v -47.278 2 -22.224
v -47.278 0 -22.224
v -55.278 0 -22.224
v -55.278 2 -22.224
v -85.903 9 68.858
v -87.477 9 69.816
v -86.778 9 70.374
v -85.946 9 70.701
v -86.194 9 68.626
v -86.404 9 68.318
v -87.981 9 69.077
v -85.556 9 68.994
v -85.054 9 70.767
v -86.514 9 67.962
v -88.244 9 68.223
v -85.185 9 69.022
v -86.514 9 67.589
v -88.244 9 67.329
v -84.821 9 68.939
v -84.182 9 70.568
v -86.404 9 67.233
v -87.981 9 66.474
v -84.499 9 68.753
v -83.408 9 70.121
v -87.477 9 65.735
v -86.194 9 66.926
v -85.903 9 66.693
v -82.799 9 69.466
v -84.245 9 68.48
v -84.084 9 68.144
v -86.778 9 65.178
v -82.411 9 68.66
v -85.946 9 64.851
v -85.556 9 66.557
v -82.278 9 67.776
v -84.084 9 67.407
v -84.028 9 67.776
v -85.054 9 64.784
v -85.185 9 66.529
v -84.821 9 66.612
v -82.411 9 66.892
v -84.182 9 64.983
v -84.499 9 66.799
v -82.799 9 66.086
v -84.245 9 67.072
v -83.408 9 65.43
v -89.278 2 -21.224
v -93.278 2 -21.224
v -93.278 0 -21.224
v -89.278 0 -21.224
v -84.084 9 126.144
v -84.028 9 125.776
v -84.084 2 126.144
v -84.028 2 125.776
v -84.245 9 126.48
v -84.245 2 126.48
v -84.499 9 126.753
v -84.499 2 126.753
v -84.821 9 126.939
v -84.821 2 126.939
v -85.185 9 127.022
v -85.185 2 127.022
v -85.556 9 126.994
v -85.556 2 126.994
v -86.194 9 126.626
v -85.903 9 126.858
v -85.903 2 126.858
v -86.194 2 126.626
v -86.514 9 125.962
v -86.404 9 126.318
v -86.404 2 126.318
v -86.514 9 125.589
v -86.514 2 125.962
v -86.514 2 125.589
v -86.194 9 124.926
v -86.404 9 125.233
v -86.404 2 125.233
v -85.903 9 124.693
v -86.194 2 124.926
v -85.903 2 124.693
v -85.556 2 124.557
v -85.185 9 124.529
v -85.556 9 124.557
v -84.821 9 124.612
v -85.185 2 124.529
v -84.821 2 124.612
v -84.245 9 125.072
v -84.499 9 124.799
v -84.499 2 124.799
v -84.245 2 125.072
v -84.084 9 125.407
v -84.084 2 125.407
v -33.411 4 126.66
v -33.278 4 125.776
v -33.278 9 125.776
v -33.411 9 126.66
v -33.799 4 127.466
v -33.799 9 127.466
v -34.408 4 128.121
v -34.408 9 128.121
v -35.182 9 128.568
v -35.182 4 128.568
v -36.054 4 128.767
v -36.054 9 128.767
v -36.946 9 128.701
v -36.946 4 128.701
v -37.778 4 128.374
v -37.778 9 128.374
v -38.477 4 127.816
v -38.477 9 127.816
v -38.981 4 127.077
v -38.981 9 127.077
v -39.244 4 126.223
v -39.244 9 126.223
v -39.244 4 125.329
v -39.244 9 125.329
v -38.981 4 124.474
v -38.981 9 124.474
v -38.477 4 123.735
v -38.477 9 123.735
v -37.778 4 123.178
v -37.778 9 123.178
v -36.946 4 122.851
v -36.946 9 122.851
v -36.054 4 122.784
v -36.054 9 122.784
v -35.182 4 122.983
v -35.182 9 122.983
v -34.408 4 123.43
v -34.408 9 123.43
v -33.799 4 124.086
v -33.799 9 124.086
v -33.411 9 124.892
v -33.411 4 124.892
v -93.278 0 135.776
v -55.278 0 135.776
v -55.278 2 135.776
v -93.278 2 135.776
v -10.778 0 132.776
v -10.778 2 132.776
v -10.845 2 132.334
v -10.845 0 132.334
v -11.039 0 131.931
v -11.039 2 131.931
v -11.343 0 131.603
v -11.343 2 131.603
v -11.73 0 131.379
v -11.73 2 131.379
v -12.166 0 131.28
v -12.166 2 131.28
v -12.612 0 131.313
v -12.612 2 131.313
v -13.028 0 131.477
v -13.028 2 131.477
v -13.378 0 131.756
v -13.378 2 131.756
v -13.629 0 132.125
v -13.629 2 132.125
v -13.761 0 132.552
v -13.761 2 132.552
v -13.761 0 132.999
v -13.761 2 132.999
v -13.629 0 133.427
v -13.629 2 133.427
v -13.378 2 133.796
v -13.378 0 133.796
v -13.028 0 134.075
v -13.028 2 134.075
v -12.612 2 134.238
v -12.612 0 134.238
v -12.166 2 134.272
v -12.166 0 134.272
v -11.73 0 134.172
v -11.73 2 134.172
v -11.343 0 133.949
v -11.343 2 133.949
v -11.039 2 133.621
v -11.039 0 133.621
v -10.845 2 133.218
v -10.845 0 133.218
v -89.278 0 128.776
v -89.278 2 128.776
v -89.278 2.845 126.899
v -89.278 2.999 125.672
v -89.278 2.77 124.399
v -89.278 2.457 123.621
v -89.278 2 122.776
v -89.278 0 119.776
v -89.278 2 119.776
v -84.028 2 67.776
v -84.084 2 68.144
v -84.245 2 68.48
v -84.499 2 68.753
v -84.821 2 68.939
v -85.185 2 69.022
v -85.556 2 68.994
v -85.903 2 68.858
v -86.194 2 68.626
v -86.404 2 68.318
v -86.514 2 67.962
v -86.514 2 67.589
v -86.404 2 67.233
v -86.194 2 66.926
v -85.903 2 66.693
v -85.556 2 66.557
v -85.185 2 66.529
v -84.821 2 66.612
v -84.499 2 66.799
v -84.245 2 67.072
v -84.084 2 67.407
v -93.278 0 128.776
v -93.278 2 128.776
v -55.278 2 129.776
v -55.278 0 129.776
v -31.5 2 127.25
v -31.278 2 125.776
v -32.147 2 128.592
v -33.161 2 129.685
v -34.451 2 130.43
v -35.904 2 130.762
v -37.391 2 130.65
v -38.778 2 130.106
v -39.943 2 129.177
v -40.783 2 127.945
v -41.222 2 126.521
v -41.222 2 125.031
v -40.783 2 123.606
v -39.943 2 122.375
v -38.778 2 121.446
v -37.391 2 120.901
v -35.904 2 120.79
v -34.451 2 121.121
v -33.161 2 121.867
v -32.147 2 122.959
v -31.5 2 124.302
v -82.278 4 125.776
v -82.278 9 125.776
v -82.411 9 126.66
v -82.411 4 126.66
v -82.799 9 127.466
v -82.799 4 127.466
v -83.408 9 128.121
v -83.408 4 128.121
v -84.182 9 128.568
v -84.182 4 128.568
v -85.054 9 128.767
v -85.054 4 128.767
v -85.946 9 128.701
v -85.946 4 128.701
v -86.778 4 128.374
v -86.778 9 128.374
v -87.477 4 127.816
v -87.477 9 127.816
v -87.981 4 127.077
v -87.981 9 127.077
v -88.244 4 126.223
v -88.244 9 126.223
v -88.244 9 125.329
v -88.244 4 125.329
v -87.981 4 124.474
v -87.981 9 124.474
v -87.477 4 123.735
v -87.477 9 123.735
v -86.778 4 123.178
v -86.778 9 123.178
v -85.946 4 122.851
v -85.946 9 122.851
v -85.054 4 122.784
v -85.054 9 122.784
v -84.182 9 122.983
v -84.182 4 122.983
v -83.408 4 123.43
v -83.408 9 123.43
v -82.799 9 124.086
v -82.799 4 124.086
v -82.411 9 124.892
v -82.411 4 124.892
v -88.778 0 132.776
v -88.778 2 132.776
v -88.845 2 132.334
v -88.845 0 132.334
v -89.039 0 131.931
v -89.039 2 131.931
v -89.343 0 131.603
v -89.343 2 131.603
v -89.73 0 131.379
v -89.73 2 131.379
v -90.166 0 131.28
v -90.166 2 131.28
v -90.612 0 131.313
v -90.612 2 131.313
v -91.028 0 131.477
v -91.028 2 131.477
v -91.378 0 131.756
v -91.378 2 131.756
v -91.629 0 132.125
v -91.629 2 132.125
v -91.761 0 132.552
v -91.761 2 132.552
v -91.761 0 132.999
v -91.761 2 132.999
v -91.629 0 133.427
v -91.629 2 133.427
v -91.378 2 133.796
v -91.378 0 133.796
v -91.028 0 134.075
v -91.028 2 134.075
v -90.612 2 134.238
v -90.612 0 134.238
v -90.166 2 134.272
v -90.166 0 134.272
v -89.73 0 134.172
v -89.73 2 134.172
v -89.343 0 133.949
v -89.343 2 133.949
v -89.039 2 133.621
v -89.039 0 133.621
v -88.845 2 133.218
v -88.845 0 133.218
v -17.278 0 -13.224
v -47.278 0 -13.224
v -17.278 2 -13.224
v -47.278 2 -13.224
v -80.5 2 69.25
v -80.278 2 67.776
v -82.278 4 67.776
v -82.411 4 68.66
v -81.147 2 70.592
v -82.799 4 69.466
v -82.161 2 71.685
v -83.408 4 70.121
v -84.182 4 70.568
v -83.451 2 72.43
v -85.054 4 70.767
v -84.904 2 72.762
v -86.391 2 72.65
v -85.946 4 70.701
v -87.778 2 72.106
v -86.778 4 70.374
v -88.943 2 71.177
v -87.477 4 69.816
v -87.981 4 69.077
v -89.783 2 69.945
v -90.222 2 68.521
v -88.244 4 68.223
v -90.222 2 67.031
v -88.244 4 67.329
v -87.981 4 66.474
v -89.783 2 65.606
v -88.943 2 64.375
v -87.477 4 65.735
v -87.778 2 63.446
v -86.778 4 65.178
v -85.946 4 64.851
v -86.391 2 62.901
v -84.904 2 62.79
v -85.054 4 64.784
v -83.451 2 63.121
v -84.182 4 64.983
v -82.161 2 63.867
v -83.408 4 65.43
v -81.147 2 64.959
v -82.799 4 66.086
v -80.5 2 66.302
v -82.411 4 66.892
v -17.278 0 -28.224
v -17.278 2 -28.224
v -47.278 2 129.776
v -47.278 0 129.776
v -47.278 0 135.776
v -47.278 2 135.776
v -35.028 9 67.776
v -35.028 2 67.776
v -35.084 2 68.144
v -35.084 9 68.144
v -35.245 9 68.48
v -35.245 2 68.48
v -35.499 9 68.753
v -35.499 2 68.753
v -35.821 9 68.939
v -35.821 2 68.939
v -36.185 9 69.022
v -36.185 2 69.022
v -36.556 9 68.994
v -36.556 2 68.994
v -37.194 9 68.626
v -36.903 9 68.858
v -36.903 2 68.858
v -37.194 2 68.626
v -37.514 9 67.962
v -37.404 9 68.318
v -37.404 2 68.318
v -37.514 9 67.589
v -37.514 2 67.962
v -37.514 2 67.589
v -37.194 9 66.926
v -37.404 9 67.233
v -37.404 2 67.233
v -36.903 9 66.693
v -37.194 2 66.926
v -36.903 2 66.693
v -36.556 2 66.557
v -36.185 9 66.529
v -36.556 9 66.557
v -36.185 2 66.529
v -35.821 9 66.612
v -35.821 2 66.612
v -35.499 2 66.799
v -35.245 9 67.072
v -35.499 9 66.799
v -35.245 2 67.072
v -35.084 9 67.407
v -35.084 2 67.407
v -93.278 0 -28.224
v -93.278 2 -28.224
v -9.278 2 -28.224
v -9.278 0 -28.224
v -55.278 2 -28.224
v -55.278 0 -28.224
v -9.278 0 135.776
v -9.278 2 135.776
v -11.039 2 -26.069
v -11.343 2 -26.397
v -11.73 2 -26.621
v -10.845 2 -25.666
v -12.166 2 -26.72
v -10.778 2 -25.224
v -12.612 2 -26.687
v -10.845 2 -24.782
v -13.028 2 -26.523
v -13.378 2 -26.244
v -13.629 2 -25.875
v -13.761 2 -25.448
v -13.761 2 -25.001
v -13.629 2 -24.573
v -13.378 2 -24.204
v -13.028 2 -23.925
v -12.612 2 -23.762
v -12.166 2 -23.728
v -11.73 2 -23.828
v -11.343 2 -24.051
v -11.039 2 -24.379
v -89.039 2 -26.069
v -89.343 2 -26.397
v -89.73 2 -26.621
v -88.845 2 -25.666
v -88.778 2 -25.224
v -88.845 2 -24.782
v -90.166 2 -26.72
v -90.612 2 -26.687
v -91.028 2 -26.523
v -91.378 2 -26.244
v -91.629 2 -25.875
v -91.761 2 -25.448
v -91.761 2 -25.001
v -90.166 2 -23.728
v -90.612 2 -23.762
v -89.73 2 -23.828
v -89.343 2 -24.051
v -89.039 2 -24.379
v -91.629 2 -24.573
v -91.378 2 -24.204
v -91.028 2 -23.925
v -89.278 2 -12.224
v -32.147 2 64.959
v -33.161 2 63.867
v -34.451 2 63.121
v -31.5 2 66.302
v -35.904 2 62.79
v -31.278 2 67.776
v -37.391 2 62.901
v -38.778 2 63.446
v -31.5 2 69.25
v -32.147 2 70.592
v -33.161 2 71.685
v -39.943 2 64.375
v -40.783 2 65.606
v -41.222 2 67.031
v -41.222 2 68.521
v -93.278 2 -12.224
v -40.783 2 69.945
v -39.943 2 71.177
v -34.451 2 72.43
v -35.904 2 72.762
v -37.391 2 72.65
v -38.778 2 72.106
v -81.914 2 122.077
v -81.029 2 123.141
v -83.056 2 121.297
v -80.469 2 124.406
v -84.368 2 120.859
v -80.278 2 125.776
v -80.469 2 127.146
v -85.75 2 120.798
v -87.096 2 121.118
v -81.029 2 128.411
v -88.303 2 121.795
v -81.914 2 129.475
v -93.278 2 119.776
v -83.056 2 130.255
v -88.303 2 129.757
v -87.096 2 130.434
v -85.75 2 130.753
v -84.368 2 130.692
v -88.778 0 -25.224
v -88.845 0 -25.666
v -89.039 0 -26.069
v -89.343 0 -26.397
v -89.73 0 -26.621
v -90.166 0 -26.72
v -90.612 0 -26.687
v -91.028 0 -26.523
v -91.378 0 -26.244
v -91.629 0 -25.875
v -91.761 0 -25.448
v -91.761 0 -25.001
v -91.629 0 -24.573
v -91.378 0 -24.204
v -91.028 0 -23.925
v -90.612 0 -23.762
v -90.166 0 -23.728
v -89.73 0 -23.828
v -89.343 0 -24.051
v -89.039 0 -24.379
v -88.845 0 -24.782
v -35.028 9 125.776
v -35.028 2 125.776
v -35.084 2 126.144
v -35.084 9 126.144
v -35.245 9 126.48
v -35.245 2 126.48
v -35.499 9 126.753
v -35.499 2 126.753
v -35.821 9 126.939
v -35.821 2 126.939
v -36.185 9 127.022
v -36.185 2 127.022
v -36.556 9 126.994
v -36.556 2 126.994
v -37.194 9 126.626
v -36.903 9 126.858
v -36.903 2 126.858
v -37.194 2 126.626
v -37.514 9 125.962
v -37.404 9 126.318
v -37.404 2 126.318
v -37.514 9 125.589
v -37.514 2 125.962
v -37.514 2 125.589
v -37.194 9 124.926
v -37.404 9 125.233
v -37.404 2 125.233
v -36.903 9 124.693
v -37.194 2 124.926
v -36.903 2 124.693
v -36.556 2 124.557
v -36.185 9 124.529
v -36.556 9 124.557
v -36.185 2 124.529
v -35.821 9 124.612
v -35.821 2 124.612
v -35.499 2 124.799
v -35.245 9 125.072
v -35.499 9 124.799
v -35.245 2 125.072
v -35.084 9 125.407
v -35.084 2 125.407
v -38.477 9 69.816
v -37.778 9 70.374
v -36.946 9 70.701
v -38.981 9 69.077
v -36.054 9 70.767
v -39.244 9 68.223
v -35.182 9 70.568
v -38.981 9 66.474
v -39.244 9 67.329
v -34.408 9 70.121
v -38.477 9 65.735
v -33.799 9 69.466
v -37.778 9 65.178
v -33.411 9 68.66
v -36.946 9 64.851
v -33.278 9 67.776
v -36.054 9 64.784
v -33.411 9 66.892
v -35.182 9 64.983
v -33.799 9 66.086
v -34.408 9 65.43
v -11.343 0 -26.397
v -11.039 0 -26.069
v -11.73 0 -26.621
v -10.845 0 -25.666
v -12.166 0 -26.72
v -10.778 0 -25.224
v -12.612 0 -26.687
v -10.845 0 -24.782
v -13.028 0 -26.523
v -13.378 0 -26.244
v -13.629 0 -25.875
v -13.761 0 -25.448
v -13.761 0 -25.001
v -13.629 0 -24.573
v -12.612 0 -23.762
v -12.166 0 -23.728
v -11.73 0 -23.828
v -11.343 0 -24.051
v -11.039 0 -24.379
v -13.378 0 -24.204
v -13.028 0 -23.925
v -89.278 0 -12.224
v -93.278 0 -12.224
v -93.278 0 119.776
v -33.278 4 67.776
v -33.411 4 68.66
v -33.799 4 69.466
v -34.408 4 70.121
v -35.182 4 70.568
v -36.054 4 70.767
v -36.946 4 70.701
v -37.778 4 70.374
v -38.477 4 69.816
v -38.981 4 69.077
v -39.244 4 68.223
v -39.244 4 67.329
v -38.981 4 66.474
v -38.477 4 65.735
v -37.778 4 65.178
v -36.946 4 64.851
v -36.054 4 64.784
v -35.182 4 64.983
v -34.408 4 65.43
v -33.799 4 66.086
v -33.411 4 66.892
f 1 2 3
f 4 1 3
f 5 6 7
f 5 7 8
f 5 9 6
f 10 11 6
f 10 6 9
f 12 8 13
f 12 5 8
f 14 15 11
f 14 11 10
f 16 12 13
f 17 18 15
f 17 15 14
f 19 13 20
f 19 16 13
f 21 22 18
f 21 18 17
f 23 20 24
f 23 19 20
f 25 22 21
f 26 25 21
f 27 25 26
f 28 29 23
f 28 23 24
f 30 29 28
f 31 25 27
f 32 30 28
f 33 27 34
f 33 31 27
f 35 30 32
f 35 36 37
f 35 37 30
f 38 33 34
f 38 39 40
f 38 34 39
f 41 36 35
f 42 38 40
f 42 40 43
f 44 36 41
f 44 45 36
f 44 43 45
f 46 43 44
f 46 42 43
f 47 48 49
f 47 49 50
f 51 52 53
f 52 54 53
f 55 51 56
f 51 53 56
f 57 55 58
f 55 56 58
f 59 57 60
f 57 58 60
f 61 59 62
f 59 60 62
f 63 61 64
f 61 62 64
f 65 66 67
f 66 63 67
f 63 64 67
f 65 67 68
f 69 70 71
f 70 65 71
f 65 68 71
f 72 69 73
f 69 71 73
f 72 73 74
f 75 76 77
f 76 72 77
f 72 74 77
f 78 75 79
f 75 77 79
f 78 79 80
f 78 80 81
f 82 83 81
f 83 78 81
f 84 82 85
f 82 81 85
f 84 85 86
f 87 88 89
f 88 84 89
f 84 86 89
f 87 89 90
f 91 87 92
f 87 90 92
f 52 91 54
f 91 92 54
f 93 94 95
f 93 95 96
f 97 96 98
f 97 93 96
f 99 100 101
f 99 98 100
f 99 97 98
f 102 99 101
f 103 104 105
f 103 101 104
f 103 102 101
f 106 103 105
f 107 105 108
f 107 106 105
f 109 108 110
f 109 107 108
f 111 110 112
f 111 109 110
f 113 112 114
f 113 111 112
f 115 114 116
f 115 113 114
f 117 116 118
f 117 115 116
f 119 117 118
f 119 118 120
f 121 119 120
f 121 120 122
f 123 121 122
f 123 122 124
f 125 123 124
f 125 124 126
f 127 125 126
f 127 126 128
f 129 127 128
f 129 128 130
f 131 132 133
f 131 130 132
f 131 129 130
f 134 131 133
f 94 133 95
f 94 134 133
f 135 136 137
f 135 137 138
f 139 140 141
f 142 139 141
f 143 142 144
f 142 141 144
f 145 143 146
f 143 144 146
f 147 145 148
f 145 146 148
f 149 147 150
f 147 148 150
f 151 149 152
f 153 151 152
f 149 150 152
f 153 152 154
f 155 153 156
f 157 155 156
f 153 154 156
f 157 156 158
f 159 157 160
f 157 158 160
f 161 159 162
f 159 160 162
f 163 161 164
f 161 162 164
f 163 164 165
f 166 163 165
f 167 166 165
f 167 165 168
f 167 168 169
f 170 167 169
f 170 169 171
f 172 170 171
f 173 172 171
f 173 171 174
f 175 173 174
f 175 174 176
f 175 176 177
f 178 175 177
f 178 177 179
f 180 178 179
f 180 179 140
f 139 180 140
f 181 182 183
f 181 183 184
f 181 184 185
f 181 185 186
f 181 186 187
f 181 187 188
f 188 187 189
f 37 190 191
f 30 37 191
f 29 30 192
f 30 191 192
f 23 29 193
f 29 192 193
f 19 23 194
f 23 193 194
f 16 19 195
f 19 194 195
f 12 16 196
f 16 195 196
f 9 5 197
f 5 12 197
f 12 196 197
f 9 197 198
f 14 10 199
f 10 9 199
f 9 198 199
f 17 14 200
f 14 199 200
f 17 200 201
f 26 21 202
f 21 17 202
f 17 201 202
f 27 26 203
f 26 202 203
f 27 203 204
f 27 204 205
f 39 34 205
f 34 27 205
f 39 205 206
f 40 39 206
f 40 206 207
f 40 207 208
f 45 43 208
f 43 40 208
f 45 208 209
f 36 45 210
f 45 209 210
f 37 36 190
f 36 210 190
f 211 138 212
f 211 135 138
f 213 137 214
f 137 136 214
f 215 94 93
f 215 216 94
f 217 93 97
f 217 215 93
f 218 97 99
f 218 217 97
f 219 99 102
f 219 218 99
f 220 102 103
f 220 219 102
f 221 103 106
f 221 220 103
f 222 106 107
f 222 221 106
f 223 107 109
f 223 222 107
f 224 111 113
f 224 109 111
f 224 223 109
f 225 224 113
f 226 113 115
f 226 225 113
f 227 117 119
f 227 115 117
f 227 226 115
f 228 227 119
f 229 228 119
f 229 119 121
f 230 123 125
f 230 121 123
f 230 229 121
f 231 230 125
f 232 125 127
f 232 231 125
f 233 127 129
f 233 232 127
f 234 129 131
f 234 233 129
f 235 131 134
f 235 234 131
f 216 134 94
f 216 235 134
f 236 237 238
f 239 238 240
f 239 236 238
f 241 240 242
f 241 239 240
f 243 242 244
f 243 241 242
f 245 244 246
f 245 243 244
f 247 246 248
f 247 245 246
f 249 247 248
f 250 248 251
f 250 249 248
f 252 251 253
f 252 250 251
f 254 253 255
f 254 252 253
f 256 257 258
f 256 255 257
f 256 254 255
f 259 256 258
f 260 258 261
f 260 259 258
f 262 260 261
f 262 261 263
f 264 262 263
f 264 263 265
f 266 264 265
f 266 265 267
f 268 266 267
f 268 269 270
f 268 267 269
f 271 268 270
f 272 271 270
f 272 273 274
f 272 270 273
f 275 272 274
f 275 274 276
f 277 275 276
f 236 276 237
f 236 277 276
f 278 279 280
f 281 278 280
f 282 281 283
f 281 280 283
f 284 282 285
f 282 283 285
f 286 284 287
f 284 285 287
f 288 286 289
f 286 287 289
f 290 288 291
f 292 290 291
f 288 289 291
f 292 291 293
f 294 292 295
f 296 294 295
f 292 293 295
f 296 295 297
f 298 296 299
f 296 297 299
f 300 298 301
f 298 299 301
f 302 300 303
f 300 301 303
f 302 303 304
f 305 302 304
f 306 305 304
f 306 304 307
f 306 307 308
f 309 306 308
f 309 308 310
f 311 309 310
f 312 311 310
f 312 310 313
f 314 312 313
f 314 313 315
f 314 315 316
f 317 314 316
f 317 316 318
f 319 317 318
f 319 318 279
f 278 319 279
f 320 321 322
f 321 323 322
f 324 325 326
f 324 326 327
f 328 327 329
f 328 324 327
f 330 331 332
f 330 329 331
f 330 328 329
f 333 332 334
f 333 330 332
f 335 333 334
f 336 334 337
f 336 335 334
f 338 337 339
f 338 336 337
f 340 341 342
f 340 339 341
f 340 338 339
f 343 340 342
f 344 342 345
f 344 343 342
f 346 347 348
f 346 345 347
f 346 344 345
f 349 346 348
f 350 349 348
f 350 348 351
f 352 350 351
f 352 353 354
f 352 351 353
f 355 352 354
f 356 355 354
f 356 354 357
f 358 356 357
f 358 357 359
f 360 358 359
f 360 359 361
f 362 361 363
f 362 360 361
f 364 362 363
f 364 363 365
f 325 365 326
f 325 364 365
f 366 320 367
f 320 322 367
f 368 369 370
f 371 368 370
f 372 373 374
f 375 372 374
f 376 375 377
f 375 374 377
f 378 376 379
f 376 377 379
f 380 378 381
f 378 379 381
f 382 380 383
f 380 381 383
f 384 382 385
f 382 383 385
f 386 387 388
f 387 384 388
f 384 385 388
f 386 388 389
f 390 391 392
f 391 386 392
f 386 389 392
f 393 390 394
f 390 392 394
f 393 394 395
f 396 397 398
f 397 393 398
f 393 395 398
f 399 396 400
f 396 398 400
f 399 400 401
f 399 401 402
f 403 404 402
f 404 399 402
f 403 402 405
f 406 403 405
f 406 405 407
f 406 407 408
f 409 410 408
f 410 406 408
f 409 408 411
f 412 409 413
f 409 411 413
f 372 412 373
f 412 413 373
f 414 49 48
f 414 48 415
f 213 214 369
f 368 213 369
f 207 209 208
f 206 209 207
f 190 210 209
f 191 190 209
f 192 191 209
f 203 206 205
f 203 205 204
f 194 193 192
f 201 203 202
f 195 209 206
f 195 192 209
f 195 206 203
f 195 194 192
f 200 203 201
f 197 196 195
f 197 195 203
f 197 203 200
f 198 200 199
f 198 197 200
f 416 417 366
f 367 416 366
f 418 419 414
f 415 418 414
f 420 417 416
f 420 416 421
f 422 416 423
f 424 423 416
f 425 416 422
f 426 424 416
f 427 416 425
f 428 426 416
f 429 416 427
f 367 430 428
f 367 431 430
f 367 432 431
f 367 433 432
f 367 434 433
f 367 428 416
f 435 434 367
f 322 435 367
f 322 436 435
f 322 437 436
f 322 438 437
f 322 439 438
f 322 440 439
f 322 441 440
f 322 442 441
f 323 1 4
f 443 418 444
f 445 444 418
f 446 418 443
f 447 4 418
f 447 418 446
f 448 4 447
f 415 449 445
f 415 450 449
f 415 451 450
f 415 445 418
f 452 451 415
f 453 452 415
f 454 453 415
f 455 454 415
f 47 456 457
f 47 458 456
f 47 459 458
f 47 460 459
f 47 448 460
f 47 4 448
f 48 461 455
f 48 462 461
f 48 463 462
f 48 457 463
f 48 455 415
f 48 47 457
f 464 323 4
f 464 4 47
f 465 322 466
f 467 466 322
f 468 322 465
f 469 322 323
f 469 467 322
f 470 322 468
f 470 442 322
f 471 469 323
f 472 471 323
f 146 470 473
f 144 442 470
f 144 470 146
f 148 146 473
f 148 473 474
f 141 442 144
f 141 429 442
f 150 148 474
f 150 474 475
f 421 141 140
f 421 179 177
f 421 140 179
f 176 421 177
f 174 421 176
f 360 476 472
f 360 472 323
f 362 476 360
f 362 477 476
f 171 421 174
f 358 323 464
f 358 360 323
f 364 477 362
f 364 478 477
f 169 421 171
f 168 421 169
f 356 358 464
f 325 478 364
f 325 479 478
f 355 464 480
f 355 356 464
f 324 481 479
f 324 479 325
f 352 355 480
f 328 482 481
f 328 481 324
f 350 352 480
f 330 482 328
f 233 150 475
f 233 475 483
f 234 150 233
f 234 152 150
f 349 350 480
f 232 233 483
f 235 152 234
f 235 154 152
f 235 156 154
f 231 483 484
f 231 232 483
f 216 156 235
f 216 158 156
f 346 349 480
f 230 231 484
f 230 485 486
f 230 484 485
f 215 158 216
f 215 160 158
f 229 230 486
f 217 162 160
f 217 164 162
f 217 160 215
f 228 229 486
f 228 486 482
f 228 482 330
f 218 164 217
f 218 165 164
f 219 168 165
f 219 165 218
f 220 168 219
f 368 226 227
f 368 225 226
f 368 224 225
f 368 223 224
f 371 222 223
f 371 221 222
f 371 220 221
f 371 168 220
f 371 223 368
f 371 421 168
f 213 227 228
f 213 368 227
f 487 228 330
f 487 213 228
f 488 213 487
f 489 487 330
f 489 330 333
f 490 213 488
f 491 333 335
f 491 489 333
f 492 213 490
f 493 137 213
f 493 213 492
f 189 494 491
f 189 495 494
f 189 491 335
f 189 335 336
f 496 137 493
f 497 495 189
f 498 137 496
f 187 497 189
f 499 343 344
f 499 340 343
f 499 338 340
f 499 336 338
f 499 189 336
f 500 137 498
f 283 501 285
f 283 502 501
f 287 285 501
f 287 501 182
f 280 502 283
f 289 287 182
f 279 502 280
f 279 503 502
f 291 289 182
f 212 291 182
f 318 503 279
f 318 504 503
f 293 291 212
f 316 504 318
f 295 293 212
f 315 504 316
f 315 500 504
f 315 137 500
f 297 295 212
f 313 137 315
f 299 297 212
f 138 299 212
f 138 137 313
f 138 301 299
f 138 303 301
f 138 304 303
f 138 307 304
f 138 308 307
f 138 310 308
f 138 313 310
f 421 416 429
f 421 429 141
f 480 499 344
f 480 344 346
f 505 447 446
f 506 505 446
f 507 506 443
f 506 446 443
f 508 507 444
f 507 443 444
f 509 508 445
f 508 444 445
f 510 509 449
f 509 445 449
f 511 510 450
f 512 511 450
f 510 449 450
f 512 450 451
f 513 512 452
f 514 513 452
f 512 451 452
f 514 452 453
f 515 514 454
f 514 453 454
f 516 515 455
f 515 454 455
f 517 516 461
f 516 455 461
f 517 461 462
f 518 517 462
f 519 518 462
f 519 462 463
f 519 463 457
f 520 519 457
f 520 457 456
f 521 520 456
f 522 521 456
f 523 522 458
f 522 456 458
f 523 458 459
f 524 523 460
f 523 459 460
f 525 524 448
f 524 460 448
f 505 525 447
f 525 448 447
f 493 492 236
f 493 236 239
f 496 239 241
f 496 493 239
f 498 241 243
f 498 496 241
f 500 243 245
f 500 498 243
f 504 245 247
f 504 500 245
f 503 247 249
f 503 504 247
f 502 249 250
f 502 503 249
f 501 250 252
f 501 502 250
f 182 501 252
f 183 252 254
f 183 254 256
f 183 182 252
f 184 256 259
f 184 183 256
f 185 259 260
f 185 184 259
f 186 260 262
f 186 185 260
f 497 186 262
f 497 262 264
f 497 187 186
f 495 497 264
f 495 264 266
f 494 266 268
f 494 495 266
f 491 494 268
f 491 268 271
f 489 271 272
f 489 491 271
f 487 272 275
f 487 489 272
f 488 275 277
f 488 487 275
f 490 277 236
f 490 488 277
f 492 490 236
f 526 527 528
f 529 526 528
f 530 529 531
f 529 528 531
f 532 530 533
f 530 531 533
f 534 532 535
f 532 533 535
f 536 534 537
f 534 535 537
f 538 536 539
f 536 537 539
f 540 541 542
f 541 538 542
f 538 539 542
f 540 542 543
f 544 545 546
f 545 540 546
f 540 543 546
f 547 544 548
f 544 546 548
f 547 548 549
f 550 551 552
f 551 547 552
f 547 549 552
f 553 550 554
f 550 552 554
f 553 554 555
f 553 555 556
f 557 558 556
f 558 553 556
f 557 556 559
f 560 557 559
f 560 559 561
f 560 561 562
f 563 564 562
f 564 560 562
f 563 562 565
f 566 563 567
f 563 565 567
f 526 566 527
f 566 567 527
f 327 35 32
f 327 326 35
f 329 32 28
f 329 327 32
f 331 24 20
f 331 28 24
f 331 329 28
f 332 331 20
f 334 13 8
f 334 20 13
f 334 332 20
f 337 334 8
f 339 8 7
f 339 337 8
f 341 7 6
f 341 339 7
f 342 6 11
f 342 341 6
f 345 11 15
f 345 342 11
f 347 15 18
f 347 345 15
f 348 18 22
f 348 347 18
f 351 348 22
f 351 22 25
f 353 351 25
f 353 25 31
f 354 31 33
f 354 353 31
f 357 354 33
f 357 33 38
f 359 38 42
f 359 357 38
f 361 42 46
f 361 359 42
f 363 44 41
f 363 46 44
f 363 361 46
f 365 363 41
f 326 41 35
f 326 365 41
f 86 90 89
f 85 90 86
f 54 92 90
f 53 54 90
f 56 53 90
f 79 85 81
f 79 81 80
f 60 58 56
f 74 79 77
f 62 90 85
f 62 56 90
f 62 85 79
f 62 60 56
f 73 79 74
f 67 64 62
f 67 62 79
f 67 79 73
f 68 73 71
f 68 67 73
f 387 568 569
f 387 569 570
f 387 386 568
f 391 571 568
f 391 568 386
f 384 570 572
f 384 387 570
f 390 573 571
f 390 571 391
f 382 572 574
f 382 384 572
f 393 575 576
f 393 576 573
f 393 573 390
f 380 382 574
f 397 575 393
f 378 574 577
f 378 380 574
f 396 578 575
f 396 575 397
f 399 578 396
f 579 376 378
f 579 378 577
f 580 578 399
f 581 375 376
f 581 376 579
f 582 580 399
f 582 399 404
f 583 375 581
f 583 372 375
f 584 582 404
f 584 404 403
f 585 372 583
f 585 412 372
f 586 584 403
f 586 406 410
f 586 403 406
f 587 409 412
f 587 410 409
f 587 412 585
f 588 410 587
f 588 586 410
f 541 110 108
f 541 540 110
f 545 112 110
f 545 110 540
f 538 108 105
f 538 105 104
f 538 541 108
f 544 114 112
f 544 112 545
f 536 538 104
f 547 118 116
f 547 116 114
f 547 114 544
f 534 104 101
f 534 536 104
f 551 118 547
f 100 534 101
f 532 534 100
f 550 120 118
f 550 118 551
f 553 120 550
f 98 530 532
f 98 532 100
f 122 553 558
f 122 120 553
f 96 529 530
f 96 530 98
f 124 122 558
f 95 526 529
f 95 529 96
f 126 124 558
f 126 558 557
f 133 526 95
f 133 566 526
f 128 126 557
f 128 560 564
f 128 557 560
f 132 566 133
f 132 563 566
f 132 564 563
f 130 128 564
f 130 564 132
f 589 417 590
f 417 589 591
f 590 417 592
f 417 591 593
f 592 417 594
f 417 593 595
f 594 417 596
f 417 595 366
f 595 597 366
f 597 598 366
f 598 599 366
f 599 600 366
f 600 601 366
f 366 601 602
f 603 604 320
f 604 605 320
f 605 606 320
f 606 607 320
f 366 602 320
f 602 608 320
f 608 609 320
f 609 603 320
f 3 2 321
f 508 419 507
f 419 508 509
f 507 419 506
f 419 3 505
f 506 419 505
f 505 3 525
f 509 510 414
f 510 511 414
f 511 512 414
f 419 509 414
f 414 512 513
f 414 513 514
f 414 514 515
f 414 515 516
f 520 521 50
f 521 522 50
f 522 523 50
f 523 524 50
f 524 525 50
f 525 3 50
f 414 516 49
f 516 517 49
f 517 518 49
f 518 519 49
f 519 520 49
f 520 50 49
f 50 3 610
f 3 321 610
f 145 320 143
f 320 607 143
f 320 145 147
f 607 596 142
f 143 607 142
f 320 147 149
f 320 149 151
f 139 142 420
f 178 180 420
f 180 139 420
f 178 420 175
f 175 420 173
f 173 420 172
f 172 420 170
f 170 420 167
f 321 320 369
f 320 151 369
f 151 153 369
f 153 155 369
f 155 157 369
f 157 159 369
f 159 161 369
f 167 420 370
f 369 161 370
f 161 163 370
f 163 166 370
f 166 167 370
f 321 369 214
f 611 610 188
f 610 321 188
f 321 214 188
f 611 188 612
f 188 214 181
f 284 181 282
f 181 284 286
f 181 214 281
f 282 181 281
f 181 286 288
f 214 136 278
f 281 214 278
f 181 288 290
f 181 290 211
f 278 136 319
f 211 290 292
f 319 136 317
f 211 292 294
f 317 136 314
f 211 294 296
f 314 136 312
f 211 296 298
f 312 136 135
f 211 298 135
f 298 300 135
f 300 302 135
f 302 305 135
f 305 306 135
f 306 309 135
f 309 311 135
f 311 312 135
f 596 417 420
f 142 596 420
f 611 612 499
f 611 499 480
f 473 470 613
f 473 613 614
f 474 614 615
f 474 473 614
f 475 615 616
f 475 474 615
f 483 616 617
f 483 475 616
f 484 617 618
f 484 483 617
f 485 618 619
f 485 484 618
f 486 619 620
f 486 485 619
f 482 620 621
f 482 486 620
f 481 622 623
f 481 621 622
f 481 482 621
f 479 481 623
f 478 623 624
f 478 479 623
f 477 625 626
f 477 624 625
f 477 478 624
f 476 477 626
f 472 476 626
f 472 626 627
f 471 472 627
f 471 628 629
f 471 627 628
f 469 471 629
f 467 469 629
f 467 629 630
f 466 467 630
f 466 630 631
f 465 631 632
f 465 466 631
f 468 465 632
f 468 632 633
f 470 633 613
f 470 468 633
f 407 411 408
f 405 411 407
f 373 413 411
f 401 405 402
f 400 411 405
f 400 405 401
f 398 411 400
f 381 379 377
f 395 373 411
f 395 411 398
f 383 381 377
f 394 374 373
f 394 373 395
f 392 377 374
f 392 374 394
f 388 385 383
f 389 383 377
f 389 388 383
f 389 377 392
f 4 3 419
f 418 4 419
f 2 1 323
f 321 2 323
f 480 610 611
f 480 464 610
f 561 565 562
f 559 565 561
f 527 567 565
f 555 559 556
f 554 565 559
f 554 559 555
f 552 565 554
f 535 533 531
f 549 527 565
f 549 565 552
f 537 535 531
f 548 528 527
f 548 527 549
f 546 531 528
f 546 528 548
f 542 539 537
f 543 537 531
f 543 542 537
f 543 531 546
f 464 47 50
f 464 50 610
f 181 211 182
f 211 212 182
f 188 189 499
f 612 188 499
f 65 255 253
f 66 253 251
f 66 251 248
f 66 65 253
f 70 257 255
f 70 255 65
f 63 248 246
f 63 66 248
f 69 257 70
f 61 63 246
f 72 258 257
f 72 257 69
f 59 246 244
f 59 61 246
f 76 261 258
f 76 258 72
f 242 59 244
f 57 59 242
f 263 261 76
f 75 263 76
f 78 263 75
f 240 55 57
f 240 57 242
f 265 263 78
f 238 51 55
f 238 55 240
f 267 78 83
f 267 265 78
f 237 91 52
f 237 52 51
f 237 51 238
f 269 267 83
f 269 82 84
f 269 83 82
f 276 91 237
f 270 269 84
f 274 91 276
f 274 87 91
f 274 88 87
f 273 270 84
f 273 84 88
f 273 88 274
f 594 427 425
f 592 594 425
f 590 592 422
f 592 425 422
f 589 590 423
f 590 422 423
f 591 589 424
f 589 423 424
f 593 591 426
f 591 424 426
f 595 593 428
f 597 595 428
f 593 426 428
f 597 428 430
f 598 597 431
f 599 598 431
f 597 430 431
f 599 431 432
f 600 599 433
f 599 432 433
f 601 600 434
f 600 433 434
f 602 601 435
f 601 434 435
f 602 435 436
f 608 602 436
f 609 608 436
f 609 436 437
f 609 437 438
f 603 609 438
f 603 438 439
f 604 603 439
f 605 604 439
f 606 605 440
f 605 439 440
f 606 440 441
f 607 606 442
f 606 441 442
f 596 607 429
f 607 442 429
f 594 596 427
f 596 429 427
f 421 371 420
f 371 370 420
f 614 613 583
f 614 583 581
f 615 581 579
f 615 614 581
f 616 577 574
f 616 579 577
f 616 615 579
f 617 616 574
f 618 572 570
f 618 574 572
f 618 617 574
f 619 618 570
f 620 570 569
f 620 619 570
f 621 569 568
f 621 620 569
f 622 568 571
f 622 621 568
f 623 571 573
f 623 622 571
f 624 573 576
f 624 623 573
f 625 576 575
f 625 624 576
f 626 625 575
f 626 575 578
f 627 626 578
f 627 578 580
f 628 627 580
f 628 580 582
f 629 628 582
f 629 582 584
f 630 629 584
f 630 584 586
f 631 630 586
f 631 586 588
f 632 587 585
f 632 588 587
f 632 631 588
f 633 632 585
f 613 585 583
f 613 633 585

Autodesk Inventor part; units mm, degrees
ref_plane "YZ Plane" through (0, 0, 0) normal (1, 0, 0) x (0, 1, 0)
ref_plane "XZ Plane" through (0, 0, 0) normal (0, 1, 0) x (-1, 0, 0)
ref_plane "XY Plane" through (0, 0, 0) normal (0, 0, 1) x (1, 0, 0)
sketch "Sketch1" plane through (0, 0, 0) normal (0, 1, 0) x (-1, 0, 0)
  line L0 (9.278, 4.7758) -> (9.278, -28.2242)
  line L1 (9.278, -28.2242) -> (47.278, -28.2242)
  line L2 (47.278, -28.2242) -> (47.278, -22.2242)
  line L3 (47.278, -22.2242) -> (55.278, -22.2242)
  line L4 (55.278, -22.2242) -> (55.278, -28.2242)
  line L5 (55.278, 135.7758) -> (55.278, 129.7758)
  line L6 (55.278, 129.7758) -> (47.278, 129.7758)
  line L7 (47.278, 129.7758) -> (47.278, 135.7758)
  line L8 (47.278, 135.7758) -> (9.278, 135.7758)
  line L9 (9.278, 135.7758) -> (9.278, 102.7758)
  line L10 (9.278, 4.7758) -> (9.278, 4.7758)
  line L11 (9.278, 4.7758) -> (9.278, 102.7758)
  line L12 (9.278, 102.7758) -> (9.278, 102.7758)
  line L13 (54.278, 130.7758) -> (54.278, 136.7758)
  line L14 (8.278, 136.7758) -> (94.278, 136.7758)
  line L15 (94.278, -29.2242) -> (8.278, -29.2242)
  line L16 (54.278, -29.2242) -> (54.278, -23.2242)
  line L17 (54.278, -23.2242) -> (48.278, -23.2242)
  line L18 (48.278, -23.2242) -> (48.278, -29.2242)
  line L19 (8.278, -29.2242) -> (8.278, 3.7758)
  line L20 (8.278, 103.7758) -> (8.278, 136.7758)
  line L21 (48.278, 136.7758) -> (48.278, 130.7758)
  line L22 (8.278, 103.7758) -> (8.278, 3.7758)
  line L23 (54.278, 130.7758) -> (48.278, 130.7758)
  line L24 (94.278, -29.2242) -> (94.278, 136.7758)
  line L25 (55.278, 135.7758) -> (94.278, 135.7758)
  line L26 (55.278, -28.2242) -> (94.278, -28.2242)
  line L27 (94.278, 135.7758) -> (93.278, 135.7758)
  line L28 (93.278, 135.7758) -> (93.278, -28.2242)
  line L29 (93.278, -28.2242) -> (94.278, -28.2242)
  line L30 (94.278, -28.2242) -> (94.278, 135.7758)
  line L31 (8.278, 3.7758) -> (8.278, 3.7758)
  line L32 (8.278, 103.7758) -> (8.278, 103.7758)
  point P0 (0, 0)
  point P1 (0, 0)
  dimension "d0" = 1
  dimension "d4" = 1
  dimension "d5" = 1
  dimension "d6" = 1
  dimension "d7" = 1
  dimension "d10" = 1
  dimension "d12" = 1
  dimension "d13" = 1
  dimension "d14" = 1
  dimension "d15" = 1
  dimension "d16" = 6
  dimension "d17" = 0
  dimension "d18" = 0
  dimension "d25" = 1
  dimension "d75" = 164
  dimension "d76" = 164
  dimension "d77" = 166
  dimension "d79" = 33
  dimension "d82" = 33
  dimension "d95" = 0
  dimension "d96" = 86
  dimension "d97" = 1
  dimension "d98" = 86
extrude "Extrusion2" add sketch "Sketch1" along normal blind 2 contours L11 L9 L8 L7 L6 L5 L25 L28 L26 L4 L3 L2 L1 L0
sketch "Sketch2" plane through (0, 2, 0) normal (0, 1, 0) x (1, 0, 0)
  circle A0 centre (-12.278, 25.2242) radius 1.5
  line L0 (-9.278, -135.7758) -> (-9.278, 28.2242) projected
  line L1 (-9.278, 28.2242) -> (-47.278, 28.2242) projected
  line L2 (-47.278, 22.2242) -> (-55.278, 22.2242) projected
  line L3 (-51.278, 22.2242) -> (-51.278, -30.1136)
  circle A1 centre (-90.278, 25.2242) radius 1.5
  line L4 (-9.278, -135.7758) -> (-9.278, 28.2242) projected
  line L5 (-9.278, -53.7758) -> (-80.3163, -53.7758)
  circle A2 centre (-12.278, -132.7758) radius 1.5
  circle A3 centre (-90.278, -132.7758) radius 1.5
  point P0 (0, 0)
  point P1 (-49.278, -4.7758)
  point P2 (-9.278, -102.7758)
  point P3 (-9.278, -4.7758)
  dimension "d26" = 3
  dimension "d27" = 3
  dimension "d28" = 3
extrude "Extrusion3" cut sketch "Sketch2" against normal blind 10
sketch "Sketch3" plane through (0, 2, 0) normal (0, 1, 0) x (1, 0, 0)
  circle A0 centre (-36.278, -67.7758) radius 1.25
  circle A1 centre (-36.278, -67.7758) radius 1.25
  circle A2 centre (-36.278, -125.7758) radius 1.25
  circle A3 centre (-36.278, -125.7758) radius 1.25
  circle A4 centre (-85.278, -67.7758) radius 1.25
  circle A5 centre (-85.278, -67.7758) radius 1.25
  circle A6 centre (-85.278, -125.7758) radius 1.25
  circle A7 centre (-85.278, -125.7758) radius 1.25
  line L0 (-47.278, -135.7758) -> (-9.278, -135.7758) projected
  line L1 (-93.278, 28.2242) -> (-93.278, -135.7758) projected
  circle A8 centre (-36.278, -67.7758) radius 3
  circle A9 centre (-36.278, -125.7758) radius 3
  circle A10 centre (-85.278, -67.7758) radius 3
  circle A11 centre (-85.278, -125.7758) radius 3
  point P0 (0, 0)
  point P1 (40, -28)
  dimension "d31" = 49
  dimension "d32" = 58
  dimension "d33" = 49
  dimension "d34" = 58
  dimension "d35" = 10
  dimension "d36" = 10
  dimension "d37" = 8
  dimension "d38" = 8
  dimension "d70" = 6
  dimension "d71" = 6
  dimension "d72" = 6
  dimension "d73" = 6
extrude "Extrusion4" add sketch "Sketch3" along normal blind 7
sketch "Sketch6" plane through (0, 2, 0) normal (0, 1, 0) x (1, 0, 0)
  line L0 (-93.278, 28.2242) -> (-93.278, -135.7758) projected
  line L1 (-93.278, 28.2242) -> (-93.278, 21.2242)
  line L2 (-93.278, 21.2242) -> (-89.278, 21.2242)
  line L3 (-89.278, 21.2242) -> (-89.278, 12.2242)
  line L4 (-89.278, 12.2242) -> (-93.278, 12.2242)
  line L5 (-93.278, 21.2242) -> (-93.278, 12.2242)
  line L6 (-93.278, -135.7758) -> (-93.278, -128.7758)
  line L7 (-93.278, -128.7758) -> (-89.278, -128.7758)
  line L8 (-89.278, -128.7758) -> (-89.278, -119.7758)
  line L9 (-89.278, -119.7758) -> (-93.278, -119.7758)
  line L10 (-93.278, -128.7758) -> (-93.278, -119.7758)
  point P0 (0, 0)
  dimension "d63" = 7
  dimension "d64" = 4
  dimension "d65" = 9
  dimension "d66" = 7
  dimension "d67" = 9
  dimension "d83" = 4
extrude "Extrusion7" cut sketch "Sketch6" against normal blind 10
sketch "Sketch7" plane through (0, 2, 0) normal (0, 1, 0) x (1, 0, 0)
  line L0 (-9.278, -135.7758) -> (-9.278, 28.2242) projected
  line L1 (-9.278, 28.2242) -> (-47.278, 28.2242) projected
  line L2 (-47.278, 28.2242) -> (-47.278, 22.2242) projected
  line L3 (-9.278, -135.7758) -> (-9.278, 28.2242) projected
  line L4 (-9.278, -4.7758) -> (-49.278, -4.7758) projected
  line L5 (-49.278, -102.7758) -> (-9.278, -102.7758) projected
  line L6 (-47.278, 28.2242) -> (-47.278, 13.2242)
  line L7 (-47.278, 13.2242) -> (-17.278, 13.2242)
  line L8 (-17.278, 13.2242) -> (-17.278, 28.2242)
  line L9 (-9.278, 28.2242) -> (-47.278, 28.2242) projected
  point P0 (0, 0)
  dimension "d94" = 15
extrude "Extrusion8" cut sketch "Sketch7" against normal blind 10
chamfer "Chamfer1" distance 2 angle 45 4 edges at (-88.278, 2, 67.7758) (-39.278, 2, 125.7758) (-39.278, 2, 67.7758) (-88.278, 2, 125.7758)
equation "\"d36\" = d35"
equation "\"d38\" = d37"
